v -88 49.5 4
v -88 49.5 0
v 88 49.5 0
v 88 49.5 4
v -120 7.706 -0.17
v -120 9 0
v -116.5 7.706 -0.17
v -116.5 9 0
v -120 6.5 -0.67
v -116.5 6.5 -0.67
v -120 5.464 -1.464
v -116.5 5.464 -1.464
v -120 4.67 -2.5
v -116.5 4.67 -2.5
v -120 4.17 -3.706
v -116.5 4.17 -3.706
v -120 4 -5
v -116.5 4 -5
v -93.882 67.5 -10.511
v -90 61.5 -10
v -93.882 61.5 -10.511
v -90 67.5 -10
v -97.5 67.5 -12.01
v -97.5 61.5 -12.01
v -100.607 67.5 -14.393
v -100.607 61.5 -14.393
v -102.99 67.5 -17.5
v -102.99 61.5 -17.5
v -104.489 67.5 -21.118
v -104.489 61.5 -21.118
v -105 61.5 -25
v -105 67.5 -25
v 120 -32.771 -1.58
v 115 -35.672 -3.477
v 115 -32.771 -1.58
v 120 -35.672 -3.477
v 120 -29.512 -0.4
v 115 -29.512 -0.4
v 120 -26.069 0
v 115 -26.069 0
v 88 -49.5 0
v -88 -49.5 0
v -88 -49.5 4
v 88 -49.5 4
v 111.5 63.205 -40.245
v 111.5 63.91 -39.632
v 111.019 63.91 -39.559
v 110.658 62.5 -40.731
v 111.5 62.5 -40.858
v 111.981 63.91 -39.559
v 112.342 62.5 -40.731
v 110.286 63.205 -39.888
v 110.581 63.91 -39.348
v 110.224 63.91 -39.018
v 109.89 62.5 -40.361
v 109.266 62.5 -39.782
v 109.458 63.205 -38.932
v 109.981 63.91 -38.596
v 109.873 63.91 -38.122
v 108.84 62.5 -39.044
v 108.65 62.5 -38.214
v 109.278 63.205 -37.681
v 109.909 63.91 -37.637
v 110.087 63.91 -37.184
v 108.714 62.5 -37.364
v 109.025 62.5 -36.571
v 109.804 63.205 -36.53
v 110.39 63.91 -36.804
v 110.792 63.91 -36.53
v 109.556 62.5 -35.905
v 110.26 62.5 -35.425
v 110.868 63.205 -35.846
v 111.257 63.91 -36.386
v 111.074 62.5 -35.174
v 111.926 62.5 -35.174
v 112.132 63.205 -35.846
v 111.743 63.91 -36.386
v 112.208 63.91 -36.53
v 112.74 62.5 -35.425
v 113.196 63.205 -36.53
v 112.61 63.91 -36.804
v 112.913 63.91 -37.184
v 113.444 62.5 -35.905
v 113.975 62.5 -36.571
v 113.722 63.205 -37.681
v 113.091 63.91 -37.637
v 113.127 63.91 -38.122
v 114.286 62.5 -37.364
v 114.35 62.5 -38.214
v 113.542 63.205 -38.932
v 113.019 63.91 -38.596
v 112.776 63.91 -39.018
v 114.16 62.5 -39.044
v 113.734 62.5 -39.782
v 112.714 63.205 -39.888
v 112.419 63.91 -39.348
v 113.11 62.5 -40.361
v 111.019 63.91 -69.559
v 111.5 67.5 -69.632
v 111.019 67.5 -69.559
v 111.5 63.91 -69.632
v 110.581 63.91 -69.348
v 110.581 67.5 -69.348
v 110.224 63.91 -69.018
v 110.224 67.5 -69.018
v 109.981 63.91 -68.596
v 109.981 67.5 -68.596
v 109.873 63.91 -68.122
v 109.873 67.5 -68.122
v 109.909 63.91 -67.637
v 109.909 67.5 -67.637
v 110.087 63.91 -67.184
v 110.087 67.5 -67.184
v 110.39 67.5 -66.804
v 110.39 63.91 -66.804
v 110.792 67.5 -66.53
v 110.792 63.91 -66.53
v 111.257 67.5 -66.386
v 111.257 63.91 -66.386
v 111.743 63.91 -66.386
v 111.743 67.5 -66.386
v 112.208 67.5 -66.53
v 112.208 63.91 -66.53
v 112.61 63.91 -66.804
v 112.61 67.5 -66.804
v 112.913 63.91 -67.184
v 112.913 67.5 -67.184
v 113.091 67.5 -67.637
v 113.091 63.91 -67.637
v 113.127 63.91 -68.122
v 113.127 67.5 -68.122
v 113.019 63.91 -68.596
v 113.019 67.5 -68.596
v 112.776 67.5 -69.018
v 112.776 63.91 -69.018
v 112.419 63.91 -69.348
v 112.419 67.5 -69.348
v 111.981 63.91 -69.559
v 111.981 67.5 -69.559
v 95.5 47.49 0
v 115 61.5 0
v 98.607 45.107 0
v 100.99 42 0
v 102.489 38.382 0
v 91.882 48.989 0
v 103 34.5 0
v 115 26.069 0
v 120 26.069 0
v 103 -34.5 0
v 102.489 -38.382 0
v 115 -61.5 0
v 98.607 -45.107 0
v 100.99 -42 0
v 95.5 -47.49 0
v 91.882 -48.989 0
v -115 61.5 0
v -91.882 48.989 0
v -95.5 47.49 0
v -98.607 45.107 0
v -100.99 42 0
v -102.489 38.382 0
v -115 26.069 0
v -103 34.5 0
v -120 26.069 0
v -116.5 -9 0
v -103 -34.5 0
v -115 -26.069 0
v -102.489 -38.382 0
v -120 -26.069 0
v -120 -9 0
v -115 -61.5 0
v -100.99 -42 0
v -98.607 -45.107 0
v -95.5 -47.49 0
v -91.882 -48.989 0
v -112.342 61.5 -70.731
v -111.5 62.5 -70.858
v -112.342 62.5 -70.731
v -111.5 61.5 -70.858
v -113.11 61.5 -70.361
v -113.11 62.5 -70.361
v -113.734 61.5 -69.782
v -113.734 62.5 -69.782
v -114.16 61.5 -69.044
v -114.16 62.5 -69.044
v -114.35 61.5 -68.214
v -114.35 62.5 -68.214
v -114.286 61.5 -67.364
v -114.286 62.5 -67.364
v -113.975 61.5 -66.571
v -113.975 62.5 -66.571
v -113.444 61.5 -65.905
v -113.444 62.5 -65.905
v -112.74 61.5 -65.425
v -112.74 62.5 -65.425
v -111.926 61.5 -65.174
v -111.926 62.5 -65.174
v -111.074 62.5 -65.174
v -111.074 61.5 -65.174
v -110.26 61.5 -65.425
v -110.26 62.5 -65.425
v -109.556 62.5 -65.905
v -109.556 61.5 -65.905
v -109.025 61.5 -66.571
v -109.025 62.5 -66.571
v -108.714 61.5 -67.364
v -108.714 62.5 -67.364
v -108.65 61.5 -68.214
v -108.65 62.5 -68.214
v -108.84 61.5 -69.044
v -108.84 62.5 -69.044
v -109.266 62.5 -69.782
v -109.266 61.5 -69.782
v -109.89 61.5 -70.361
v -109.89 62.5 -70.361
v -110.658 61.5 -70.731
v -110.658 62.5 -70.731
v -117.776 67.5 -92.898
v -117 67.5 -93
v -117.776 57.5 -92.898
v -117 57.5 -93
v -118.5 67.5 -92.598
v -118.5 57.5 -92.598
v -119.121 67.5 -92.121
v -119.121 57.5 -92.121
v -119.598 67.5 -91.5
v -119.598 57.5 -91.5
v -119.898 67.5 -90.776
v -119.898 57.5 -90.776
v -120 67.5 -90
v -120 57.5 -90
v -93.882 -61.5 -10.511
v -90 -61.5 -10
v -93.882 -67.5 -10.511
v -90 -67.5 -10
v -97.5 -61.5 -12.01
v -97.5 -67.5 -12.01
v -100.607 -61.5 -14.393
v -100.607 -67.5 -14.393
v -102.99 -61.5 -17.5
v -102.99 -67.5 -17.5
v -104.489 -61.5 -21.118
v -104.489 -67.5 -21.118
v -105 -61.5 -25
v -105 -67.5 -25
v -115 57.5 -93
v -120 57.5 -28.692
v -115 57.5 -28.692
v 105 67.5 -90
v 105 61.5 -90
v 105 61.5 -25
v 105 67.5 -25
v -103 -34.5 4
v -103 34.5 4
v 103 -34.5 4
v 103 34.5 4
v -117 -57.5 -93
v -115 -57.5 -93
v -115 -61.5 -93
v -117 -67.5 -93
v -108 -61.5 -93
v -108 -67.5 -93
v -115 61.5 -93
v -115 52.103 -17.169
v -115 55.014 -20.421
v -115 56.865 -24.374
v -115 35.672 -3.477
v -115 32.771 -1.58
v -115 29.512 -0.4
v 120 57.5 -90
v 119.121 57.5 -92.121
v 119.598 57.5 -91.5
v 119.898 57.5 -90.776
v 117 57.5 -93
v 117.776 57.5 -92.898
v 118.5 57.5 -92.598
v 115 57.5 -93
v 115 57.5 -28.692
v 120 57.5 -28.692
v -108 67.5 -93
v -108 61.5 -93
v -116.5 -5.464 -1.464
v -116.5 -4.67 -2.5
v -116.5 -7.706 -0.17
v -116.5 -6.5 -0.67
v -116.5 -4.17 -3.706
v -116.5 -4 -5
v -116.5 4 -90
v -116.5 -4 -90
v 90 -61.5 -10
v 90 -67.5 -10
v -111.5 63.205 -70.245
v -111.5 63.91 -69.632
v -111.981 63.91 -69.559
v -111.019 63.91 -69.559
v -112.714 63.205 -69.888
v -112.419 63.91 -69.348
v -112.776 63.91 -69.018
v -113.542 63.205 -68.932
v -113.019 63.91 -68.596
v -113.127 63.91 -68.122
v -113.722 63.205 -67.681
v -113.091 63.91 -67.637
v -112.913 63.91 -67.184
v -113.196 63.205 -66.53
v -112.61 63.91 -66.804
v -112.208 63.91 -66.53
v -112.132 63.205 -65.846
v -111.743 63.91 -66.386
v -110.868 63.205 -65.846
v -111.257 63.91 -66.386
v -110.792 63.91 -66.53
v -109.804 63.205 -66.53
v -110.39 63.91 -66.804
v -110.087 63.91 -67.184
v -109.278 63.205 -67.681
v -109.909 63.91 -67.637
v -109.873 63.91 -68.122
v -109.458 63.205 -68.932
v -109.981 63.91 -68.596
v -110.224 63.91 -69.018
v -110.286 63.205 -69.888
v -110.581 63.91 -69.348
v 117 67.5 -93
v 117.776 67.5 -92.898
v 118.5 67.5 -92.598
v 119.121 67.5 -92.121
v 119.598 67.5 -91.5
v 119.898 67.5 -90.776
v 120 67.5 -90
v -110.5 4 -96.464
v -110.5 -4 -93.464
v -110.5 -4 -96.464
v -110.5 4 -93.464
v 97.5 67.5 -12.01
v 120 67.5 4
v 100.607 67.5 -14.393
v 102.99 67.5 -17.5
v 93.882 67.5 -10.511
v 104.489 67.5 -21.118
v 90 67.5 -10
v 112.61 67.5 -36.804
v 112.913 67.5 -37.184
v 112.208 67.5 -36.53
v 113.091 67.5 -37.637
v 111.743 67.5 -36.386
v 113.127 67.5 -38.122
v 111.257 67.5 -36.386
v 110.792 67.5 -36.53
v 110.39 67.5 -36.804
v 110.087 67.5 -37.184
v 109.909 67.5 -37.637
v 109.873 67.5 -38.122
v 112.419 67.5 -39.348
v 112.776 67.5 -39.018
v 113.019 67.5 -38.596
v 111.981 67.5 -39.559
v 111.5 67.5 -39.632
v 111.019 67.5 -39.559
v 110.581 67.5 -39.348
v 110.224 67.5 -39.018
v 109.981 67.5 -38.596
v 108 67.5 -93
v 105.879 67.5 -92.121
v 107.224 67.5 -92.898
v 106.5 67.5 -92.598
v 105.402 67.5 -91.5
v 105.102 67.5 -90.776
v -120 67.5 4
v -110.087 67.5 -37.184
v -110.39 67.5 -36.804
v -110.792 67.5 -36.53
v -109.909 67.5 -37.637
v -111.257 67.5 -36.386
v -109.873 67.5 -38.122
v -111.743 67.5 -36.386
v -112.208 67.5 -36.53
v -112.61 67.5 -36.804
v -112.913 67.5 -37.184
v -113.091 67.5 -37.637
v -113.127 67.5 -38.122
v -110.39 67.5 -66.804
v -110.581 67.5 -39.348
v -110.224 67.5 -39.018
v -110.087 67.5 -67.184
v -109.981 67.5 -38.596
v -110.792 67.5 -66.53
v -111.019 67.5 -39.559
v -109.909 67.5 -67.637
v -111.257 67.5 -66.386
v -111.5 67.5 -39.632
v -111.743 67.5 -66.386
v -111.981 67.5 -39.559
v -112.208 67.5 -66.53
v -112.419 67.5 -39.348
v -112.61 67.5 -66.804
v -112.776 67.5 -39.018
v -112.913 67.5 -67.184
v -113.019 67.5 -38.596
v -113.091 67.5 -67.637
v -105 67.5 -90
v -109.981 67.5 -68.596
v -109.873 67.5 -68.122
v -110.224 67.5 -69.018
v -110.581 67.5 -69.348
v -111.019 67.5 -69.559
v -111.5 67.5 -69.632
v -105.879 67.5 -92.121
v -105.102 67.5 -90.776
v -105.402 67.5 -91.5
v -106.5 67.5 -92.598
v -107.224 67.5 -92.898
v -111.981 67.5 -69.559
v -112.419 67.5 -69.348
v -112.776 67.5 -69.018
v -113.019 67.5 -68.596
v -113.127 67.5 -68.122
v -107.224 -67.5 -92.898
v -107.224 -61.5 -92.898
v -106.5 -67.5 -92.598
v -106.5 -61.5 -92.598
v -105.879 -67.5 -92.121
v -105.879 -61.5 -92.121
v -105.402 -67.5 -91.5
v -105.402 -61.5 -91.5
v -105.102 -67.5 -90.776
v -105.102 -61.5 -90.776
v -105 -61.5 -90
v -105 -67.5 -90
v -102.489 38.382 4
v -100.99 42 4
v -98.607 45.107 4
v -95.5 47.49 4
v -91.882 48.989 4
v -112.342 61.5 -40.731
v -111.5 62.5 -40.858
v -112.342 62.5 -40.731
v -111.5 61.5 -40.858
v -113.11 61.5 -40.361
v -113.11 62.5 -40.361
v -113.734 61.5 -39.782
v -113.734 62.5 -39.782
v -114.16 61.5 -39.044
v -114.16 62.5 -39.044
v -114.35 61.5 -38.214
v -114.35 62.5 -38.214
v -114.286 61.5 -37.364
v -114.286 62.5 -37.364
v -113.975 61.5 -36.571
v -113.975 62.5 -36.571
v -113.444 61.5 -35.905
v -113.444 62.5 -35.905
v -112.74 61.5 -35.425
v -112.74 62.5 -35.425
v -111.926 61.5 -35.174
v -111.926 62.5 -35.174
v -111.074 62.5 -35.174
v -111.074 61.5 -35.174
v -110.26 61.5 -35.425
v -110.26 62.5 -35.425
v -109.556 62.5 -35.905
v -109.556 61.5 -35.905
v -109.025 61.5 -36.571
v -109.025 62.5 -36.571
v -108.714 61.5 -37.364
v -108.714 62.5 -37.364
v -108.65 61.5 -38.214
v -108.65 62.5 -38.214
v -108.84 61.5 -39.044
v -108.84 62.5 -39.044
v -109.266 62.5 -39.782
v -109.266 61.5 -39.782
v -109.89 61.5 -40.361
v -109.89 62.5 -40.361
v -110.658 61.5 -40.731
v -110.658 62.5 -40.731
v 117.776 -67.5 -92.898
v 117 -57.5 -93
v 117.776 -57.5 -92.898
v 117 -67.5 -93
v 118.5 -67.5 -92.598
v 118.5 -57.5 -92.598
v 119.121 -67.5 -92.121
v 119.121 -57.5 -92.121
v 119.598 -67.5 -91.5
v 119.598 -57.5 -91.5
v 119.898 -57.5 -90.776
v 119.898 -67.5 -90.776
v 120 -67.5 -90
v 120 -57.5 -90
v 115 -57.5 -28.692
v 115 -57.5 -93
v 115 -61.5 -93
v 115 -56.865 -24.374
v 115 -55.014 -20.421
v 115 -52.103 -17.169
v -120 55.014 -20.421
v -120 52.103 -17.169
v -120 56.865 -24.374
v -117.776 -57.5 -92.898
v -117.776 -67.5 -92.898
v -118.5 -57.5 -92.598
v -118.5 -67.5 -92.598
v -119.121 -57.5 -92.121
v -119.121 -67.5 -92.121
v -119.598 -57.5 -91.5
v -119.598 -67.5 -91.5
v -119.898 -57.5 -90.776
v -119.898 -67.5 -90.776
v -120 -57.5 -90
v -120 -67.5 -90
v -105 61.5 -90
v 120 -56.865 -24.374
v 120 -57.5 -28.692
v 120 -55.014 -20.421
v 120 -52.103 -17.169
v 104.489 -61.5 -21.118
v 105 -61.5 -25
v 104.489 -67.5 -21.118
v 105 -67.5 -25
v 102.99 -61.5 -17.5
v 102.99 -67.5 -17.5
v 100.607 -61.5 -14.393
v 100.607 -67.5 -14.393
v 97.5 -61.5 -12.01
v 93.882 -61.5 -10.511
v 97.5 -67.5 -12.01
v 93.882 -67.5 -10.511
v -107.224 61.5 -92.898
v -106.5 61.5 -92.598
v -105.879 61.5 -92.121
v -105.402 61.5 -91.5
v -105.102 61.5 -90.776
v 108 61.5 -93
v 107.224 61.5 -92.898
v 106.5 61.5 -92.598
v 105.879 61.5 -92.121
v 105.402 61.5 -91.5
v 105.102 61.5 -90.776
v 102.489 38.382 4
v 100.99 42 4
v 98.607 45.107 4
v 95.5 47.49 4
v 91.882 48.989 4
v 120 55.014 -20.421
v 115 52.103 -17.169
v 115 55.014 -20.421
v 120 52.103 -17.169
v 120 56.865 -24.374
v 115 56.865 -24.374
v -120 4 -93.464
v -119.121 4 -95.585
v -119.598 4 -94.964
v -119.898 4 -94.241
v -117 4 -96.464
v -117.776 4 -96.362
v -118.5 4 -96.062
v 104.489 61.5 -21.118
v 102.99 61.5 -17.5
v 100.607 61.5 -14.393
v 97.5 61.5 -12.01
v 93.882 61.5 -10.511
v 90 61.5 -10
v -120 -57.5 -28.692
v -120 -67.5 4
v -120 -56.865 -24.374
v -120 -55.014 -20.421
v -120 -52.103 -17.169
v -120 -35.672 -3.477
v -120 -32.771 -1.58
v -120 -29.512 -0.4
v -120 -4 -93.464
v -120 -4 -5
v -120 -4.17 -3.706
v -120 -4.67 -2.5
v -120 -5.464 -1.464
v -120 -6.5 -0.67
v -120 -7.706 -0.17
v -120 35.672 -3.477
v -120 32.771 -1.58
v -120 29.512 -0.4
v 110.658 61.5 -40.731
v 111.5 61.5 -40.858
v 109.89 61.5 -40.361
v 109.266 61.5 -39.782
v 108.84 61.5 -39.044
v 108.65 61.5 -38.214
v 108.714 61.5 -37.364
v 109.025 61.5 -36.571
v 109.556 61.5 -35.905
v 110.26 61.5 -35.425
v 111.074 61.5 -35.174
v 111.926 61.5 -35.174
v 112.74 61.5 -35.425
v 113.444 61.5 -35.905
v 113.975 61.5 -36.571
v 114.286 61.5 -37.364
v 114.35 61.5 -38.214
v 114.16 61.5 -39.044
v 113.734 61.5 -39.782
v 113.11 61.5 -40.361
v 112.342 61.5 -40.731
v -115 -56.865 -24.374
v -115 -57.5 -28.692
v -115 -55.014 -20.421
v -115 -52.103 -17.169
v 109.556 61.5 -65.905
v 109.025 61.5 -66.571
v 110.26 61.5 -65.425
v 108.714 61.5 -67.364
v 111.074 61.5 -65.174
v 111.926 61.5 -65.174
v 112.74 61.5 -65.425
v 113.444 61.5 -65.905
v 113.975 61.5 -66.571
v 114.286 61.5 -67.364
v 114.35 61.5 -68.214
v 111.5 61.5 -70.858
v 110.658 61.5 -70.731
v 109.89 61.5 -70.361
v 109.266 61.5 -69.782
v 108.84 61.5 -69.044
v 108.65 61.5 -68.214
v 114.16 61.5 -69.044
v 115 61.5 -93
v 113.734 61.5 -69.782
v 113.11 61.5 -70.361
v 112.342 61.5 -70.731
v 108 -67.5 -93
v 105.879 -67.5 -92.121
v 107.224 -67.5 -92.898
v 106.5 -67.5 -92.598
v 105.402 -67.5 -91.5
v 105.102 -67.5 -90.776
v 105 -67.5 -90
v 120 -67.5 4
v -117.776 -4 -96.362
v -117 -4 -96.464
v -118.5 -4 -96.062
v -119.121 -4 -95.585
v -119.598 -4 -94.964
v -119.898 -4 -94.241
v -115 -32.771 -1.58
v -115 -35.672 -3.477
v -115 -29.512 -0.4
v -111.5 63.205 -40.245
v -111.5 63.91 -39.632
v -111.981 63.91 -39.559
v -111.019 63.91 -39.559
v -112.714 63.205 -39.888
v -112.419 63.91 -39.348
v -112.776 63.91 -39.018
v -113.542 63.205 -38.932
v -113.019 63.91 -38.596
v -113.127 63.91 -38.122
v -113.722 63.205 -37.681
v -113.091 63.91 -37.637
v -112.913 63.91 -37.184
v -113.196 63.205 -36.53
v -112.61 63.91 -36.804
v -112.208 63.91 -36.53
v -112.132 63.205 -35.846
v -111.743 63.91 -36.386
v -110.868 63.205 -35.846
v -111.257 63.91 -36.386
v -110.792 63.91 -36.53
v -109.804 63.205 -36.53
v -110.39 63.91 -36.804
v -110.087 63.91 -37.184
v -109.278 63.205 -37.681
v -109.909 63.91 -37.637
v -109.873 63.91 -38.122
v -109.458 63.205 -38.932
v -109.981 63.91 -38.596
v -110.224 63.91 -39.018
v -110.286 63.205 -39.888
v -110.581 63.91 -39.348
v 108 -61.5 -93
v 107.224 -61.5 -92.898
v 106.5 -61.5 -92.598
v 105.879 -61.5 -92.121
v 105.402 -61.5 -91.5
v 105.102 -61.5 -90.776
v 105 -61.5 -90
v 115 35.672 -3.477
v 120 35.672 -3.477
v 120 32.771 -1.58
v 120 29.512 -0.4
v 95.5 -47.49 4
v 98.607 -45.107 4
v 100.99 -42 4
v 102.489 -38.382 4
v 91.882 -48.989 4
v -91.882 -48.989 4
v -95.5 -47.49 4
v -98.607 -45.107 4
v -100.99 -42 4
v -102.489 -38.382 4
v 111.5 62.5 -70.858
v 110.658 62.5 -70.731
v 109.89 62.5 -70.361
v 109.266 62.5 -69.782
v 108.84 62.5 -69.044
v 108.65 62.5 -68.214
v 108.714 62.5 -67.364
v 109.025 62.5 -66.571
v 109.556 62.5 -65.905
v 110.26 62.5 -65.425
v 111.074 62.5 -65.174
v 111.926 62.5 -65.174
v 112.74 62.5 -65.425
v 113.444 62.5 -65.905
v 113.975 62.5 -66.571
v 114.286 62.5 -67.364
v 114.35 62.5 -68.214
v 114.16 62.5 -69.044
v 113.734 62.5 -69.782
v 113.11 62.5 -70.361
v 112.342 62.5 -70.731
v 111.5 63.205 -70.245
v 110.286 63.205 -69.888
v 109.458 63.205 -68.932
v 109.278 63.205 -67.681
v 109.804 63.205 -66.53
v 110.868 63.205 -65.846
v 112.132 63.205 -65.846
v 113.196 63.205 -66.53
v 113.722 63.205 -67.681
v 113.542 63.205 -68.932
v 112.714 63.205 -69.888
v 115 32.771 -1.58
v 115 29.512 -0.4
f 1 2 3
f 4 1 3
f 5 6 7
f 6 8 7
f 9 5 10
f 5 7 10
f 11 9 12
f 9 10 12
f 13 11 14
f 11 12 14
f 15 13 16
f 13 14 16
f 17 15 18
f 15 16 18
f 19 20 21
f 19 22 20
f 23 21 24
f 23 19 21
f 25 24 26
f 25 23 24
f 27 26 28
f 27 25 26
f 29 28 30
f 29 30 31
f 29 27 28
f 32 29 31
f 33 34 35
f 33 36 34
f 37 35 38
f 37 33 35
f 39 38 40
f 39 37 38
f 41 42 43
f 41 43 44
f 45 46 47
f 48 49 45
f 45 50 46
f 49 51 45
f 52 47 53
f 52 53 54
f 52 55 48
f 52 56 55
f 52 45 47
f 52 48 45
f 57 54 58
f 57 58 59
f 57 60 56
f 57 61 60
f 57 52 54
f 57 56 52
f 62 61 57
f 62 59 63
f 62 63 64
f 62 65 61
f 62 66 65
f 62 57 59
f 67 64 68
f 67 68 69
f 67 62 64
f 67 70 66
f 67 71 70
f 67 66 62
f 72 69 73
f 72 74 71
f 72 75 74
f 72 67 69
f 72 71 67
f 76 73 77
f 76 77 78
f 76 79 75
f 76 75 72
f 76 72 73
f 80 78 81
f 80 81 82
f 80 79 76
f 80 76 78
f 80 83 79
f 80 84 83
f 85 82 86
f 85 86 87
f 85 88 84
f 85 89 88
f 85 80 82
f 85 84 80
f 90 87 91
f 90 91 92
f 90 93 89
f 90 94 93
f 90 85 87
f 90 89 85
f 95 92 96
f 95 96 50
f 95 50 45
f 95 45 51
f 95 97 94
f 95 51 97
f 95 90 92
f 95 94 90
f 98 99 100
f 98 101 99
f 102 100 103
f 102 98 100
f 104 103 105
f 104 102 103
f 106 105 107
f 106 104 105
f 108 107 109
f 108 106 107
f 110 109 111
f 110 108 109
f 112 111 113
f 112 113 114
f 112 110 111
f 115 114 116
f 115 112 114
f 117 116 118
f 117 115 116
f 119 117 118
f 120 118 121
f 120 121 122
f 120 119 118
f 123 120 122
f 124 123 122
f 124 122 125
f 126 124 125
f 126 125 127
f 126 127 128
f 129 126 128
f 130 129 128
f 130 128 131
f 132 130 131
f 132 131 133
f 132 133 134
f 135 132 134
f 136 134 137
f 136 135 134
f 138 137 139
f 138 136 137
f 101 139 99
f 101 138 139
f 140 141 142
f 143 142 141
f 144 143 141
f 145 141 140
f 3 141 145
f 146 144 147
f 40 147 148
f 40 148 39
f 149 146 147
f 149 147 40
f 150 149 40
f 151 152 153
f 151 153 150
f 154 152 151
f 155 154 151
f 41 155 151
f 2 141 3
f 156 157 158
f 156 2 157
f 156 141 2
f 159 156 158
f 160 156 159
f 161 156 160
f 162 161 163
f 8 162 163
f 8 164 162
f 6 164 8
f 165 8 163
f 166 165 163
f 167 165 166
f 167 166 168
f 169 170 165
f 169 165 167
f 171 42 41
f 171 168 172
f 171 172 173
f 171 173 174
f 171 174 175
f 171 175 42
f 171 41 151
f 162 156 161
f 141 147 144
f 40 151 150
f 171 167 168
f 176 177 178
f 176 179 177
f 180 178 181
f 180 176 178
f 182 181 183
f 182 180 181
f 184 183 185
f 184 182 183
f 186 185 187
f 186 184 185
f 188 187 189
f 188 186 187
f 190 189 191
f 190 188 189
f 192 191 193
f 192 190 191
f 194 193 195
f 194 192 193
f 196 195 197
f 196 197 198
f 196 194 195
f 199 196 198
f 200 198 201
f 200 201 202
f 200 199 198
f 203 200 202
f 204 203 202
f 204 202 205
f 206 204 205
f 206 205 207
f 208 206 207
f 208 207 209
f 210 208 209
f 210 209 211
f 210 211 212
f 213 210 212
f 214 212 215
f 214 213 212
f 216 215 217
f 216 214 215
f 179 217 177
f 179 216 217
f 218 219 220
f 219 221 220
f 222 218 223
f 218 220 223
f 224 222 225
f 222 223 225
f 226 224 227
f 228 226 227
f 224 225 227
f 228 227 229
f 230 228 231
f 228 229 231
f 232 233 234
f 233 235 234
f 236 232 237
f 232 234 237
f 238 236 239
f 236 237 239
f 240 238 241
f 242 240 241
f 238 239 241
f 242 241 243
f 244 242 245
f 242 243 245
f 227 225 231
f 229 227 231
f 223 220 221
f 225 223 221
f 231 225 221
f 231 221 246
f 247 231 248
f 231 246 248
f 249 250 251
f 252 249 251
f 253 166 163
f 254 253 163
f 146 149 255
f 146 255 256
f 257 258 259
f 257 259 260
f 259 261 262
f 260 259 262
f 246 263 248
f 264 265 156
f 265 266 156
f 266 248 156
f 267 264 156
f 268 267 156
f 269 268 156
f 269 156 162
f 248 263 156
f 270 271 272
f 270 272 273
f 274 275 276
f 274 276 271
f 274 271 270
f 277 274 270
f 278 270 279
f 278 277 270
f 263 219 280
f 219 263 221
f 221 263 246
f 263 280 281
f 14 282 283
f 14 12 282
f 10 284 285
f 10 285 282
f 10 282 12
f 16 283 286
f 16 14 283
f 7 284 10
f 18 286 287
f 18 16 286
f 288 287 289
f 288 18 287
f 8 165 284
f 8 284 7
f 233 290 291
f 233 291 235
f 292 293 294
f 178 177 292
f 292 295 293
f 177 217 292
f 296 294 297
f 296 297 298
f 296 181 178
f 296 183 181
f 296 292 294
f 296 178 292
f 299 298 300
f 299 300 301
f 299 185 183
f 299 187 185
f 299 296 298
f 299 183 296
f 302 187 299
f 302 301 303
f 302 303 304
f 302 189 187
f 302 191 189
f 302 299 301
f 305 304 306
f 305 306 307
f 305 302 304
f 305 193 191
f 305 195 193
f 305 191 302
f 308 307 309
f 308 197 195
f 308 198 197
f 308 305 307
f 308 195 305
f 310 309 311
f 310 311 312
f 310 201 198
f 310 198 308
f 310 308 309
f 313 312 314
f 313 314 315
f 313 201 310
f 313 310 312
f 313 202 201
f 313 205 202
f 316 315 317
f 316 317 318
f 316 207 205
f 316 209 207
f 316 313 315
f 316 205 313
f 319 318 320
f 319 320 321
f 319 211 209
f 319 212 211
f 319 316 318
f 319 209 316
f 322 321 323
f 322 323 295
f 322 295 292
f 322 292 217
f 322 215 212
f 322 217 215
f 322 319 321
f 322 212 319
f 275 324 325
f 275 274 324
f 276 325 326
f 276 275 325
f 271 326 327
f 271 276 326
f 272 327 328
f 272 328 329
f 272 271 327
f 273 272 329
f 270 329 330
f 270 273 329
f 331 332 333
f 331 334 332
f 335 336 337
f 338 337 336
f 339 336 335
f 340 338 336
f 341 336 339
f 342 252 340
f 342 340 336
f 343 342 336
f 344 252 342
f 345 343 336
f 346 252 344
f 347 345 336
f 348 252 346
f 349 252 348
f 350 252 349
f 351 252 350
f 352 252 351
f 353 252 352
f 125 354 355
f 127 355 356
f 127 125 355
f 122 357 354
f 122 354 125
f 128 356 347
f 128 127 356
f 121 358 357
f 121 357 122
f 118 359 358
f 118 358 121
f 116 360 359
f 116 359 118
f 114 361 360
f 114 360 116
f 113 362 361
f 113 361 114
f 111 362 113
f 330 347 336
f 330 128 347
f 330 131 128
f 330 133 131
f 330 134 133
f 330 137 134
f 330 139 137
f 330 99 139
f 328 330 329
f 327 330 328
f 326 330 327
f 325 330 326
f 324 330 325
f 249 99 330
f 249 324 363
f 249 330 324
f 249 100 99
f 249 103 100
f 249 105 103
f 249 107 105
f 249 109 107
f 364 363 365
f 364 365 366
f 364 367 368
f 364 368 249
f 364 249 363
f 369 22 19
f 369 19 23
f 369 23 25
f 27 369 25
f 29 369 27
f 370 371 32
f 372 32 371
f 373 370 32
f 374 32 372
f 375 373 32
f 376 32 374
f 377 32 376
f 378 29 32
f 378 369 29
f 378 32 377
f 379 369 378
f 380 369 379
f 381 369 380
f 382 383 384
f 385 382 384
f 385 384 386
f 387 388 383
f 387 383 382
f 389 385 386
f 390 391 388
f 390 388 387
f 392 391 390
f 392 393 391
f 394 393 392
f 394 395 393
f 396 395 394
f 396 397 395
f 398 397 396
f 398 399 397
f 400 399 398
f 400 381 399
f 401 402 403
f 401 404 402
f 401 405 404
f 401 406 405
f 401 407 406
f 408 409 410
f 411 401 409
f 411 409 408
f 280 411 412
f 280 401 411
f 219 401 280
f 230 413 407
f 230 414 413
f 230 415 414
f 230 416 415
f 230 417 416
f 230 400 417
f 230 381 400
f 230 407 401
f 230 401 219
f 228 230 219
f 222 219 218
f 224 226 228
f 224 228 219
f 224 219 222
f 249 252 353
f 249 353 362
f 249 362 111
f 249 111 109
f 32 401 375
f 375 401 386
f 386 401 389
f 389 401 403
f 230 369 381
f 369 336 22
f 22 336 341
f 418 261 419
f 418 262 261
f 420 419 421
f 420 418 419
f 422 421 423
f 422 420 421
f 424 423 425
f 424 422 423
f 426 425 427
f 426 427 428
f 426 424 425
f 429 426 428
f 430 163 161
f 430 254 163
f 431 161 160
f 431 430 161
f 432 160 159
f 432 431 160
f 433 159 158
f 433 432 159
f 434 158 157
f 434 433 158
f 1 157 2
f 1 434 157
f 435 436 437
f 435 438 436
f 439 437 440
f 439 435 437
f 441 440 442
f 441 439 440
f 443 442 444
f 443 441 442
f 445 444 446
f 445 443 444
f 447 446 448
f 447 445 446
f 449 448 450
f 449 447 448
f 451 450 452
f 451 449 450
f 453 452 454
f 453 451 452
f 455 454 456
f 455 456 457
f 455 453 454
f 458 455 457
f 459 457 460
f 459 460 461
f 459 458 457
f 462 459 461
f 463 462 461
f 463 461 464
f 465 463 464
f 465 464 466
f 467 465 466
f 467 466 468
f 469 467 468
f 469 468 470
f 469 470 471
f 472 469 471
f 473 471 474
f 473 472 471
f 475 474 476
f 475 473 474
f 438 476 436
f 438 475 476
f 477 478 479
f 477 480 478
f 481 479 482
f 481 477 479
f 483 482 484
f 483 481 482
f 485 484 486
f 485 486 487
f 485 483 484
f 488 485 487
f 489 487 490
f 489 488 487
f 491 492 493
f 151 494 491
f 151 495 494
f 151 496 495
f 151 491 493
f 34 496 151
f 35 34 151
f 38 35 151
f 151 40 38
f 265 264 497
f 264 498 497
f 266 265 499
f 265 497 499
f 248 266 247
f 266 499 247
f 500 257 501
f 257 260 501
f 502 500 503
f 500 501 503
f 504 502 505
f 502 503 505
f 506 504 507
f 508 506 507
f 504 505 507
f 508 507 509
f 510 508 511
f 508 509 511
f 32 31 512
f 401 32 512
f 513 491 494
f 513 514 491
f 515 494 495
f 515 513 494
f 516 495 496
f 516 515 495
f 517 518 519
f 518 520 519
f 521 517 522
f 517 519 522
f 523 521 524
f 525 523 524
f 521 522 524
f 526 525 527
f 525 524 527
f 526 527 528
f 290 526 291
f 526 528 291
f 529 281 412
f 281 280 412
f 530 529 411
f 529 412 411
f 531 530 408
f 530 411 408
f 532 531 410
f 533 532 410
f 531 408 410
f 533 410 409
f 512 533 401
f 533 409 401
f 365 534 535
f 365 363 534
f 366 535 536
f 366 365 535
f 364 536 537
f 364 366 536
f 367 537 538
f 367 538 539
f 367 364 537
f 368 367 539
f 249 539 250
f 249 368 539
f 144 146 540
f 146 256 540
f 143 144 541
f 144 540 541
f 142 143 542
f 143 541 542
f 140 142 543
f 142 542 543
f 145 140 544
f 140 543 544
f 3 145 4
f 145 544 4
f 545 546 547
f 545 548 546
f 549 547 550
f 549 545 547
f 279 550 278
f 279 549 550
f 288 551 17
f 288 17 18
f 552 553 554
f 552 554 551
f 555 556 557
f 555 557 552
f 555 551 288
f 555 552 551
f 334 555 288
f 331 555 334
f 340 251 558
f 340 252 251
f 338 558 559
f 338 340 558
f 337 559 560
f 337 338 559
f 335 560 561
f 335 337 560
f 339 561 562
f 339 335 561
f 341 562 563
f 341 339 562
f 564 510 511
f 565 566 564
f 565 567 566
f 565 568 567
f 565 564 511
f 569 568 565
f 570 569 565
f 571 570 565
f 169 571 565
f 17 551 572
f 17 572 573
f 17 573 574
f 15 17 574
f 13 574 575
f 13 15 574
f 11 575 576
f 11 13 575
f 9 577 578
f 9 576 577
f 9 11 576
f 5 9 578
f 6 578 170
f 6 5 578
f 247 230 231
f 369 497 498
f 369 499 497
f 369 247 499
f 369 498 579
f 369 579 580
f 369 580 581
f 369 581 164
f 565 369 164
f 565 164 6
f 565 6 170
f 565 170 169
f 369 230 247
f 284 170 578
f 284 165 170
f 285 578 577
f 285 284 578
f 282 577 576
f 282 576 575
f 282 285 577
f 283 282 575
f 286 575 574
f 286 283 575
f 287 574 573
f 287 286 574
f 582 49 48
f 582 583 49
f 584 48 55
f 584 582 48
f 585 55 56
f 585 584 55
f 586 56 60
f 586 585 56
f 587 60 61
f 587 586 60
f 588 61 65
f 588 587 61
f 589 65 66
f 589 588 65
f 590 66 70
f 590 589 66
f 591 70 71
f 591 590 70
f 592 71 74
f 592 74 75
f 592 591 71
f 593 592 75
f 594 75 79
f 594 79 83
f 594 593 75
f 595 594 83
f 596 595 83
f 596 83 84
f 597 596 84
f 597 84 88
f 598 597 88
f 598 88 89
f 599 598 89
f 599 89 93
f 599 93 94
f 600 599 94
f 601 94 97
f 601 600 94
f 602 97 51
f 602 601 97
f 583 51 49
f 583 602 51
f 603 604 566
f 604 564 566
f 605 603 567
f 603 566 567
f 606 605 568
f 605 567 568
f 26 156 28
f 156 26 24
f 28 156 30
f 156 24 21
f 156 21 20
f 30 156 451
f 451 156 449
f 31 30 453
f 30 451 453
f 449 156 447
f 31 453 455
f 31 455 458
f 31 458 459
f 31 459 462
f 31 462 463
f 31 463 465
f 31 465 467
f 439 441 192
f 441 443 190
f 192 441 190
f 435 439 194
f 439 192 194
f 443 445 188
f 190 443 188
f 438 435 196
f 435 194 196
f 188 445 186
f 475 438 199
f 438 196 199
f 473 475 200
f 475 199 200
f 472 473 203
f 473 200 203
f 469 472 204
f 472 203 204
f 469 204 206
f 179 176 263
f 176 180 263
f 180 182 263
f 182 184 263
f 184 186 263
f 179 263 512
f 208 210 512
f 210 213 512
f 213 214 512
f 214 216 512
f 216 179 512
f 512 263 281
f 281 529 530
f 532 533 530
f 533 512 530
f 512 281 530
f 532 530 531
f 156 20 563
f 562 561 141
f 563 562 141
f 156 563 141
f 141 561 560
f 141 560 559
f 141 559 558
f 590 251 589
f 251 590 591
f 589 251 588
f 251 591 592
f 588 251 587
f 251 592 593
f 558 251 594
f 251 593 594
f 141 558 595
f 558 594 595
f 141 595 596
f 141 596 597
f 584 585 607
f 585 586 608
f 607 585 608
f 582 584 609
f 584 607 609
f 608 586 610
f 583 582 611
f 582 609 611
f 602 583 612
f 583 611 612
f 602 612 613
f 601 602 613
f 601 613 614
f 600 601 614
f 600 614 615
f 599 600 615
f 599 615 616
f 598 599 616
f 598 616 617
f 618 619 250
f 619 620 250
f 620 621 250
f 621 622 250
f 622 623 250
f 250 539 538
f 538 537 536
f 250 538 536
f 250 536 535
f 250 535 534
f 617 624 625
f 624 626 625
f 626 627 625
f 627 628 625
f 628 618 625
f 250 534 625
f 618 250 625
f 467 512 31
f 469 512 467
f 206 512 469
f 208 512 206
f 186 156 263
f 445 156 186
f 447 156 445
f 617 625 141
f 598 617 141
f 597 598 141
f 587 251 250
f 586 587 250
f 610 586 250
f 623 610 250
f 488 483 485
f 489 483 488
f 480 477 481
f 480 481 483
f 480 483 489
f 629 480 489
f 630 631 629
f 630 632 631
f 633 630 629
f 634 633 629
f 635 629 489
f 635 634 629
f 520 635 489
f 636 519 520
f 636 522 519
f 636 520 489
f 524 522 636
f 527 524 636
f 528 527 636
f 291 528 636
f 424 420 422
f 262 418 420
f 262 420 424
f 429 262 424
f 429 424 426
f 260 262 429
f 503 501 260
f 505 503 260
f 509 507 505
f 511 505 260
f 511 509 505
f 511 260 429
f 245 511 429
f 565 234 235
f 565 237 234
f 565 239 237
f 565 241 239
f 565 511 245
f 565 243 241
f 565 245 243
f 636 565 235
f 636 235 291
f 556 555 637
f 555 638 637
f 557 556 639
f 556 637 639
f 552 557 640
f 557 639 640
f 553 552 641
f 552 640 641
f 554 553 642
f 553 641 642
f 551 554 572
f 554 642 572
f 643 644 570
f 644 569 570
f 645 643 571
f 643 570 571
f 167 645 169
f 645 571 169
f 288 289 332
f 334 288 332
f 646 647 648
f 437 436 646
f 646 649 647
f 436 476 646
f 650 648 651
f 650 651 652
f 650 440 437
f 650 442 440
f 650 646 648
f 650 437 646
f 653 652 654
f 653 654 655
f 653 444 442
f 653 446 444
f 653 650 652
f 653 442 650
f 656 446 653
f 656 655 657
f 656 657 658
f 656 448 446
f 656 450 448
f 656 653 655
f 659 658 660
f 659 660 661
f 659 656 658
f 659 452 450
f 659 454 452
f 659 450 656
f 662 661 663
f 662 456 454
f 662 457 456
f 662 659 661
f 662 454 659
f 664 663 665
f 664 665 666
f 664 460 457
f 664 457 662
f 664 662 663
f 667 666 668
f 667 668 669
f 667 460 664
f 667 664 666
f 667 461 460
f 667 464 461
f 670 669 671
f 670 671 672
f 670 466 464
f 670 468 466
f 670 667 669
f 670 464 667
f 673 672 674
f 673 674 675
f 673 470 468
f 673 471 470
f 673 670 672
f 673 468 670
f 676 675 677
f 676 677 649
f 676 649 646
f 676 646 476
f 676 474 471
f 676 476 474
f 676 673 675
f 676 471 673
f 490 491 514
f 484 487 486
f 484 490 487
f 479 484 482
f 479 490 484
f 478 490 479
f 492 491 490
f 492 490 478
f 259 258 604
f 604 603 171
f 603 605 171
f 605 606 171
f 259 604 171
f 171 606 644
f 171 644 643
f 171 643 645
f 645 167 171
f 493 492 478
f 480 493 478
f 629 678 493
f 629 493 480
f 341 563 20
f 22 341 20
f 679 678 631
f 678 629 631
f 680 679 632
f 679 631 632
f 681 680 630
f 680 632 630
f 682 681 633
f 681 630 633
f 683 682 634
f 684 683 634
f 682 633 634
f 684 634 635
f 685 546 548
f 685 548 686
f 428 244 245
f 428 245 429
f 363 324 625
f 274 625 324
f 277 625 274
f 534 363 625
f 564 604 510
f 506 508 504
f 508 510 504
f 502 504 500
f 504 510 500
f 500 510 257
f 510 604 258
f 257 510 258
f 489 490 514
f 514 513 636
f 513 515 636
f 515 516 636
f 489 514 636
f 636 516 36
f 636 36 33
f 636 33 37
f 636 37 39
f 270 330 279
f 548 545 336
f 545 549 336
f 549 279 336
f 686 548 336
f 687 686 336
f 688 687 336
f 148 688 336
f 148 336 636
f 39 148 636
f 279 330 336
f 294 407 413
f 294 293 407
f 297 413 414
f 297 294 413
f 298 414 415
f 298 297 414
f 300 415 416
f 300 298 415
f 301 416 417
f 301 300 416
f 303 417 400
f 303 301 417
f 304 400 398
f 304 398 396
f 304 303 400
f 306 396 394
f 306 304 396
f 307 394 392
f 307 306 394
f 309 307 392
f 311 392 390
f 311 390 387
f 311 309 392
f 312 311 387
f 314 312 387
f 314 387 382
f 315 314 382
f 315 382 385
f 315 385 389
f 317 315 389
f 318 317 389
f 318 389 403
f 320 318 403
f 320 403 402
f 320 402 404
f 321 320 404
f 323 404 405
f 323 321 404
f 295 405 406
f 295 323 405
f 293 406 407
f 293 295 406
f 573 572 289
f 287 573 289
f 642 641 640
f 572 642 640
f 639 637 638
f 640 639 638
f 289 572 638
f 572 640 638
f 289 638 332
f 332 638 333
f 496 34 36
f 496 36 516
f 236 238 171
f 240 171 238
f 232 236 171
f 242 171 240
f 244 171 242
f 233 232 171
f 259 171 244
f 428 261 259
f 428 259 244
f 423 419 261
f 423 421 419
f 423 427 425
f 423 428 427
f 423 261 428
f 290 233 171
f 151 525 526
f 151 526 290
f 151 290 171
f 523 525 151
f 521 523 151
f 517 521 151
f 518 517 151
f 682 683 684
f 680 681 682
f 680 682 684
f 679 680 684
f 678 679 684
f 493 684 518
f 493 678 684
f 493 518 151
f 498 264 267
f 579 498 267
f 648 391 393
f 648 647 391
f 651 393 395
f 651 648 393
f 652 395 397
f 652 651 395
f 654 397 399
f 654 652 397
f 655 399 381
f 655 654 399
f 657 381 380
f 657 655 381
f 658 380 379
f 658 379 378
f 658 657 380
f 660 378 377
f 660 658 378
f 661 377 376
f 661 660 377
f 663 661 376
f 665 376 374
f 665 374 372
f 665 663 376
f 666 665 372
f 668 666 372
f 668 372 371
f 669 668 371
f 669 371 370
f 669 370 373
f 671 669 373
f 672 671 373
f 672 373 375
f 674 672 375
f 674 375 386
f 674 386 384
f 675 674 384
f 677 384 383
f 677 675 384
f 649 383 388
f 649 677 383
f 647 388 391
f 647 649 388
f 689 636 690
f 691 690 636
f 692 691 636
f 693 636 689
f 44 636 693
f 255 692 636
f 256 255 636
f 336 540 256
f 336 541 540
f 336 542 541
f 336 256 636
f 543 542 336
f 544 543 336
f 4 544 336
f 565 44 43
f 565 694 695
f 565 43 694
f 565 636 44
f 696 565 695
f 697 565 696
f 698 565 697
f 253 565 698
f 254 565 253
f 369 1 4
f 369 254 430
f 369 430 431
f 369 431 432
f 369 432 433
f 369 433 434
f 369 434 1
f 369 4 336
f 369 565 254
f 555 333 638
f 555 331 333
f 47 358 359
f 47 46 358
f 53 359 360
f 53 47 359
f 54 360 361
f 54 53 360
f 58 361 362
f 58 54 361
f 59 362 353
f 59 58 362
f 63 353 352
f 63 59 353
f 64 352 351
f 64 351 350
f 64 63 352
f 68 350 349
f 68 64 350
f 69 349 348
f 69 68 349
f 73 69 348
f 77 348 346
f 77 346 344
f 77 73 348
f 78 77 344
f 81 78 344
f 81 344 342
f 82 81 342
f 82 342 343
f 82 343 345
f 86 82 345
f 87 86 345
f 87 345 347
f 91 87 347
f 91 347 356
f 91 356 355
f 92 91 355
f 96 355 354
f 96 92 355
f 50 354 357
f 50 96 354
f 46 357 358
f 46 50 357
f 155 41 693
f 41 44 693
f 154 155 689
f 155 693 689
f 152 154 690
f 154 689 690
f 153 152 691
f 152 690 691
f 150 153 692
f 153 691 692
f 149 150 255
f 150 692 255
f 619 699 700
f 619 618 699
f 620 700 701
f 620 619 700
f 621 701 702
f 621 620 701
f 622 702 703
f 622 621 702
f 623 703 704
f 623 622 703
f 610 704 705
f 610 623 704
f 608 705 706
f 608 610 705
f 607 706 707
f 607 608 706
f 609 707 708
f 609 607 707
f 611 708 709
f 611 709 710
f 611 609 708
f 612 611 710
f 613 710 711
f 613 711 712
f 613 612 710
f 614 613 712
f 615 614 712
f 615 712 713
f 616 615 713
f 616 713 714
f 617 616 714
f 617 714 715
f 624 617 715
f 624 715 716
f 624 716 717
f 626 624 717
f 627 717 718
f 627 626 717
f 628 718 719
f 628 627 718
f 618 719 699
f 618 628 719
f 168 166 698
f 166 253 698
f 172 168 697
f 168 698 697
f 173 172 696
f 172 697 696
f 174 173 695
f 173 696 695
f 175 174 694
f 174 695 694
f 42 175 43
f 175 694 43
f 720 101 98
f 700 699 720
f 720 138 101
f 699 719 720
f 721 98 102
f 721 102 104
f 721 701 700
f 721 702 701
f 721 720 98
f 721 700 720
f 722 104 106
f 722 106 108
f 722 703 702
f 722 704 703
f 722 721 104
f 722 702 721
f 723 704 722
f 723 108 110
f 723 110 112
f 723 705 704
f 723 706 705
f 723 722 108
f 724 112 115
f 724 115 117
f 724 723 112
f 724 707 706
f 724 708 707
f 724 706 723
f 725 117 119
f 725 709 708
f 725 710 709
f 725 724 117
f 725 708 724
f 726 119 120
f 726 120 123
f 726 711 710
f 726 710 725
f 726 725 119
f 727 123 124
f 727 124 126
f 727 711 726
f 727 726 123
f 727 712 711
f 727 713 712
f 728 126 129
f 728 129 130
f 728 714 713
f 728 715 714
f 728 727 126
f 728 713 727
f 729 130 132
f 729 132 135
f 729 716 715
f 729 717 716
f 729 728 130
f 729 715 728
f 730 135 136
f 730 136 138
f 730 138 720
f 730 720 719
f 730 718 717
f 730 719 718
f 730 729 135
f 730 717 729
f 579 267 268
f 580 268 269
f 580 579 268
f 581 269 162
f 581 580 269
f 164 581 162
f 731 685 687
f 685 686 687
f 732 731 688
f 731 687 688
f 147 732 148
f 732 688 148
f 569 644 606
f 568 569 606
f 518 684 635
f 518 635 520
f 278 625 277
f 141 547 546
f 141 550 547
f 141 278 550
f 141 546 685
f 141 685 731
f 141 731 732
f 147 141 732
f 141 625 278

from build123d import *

# Parameters (mm, degrees)
SKETCH1_W                                     = 230
SKETCH1_H                                     = 123
SKETCH1_W_2                                   = 206
SKETCH1_H_2                                   = 99
BOSS_EXTRUDE1_DEPTH                           = 4
SKETCH2_W                                     = 230
SKETCH2_H                                     = 4
BOSS_EXTRUDE2_DEPTH                           = 6
BOSS_EXTRUDE3_DEPTH                           = 5
FILLET1_R                                     = 15
BOSS_EXTRUDE4_DEPTH                           = 4
FILLET2_R                                     = 5
FILLET3_R                                     = 3
CSK_FOR_4_FLAT_HEAD_MACHINE_SCREW1_AT_2_COUNT = 2
CSK_FOR_4_FLAT_HEAD_MACHINE_SCREW1_AT_2_PITCH = 30
CSK_FOR_4_FLAT_HEAD_MACHINE_SCREW1_AT_3_COUNT = 2
CSK_FOR_4_FLAT_HEAD_MACHINE_SCREW1_AT_3_PITCH = 225.008888713
CSK_FOR_4_FLAT_HEAD_MACHINE_SCREW1_AT_4_COUNT = 2
CSK_FOR_4_FLAT_HEAD_MACHINE_SCREW1_AT_4_PITCH = 223


with BuildPart() as part:
    # Sketch1 → Boss-Extrude1 (new body)
    with BuildSketch(Plane.XY):
        Rectangle(SKETCH1_W, SKETCH1_H)
        Rectangle(SKETCH1_W_2, SKETCH1_H_2, mode=Mode.SUBTRACT)
    extrude(amount=BOSS_EXTRUDE1_DEPTH)

    # Sketch2 → Boss-Extrude2 (add)
    with BuildSketch(Plane(origin=(0, 61.5, 0), x_dir=(1, 0, 0), z_dir=(0, 1, 0))):
        Polygon((-115, 10), (-115, 0), (115, 0), (115, 10), (115, 93), (105, 93), (105, 10), (-105, 10), (-105, 93), (-115, 93), align=None)
        with Locations((0, -2)):
            Rectangle(SKETCH2_W, SKETCH2_H)
    boss_extrude2 = extrude(amount=BOSS_EXTRUDE2_DEPTH)

    # Mirror1: Boss-Extrude2 across plane
    add(boss_extrude2.mirror(Plane.ZX))

    # Sketch3 → Boss-Extrude3 (add)
    with BuildSketch(Plane.ZY.offset(115)):
        Polygon((-93, 61.5), (0, 61.5), (0, -61.5), (-93, -61.5), (-93, -67.5), (4, -67.5), (4, 67.5), (-93, 67.5), align=None)
        Polygon((0, 61.5), (-25, 61.5), (-21.666666667, 57.5), (0, 31.5), align=None)
        Polygon((0, -61.5), (0, -31.5), (-21.666666667, -57.5), (-25, -61.5), align=None)
        Polygon((-21.666666667, 57.5), (-25, 61.5), (-93, 61.5), (-93, 57.5), align=None)
        Polygon((-25, -61.5), (-21.666666667, -57.5), (-93, -57.5), (-93, -61.5), align=None)
    boss_extrude3 = extrude(amount=BOSS_EXTRUDE3_DEPTH)

    # Mirror2: Boss-Extrude3 across plane
    add(boss_extrude3.mirror(Plane(origin=(0, 0, 0), x_dir=(0, 0, 1), z_dir=(1, 0, 0))))

    # Fillet1
    fillet1_edges = [part.edges().sort_by_distance(p)[0] for p in [
        (117.5, 57.5, -21.666666667),
        (117.5, -57.5, -21.666666667),
        (117.5, -31.5, 0),
        (117.5, 31.5, 0),
        (-103, -49.5, 2),
        (103, -49.5, 2),
        (103, 49.5, 2),
        (-103, 49.5, 2),
        (105, 64.5, -10),
        (-105, 64.5, -10),
        (-105, -64.5, -10),
        (105, -64.5, -10),
        (-117.5, 57.5, -21.666666667),
        (-117.5, 31.5, 0),
        (-117.5, -31.5, 0),
        (-117.5, -57.5, -21.666666667),
    ]]
    fillet(fillet1_edges, radius=FILLET1_R)

    # Sketch4 → Boss-Extrude4 (add, symmetric)
    with BuildSketch(Plane(origin=(0, 0, 0), x_dir=(1, 0, 0), z_dir=(0, 1, 0))):
        Polygon((-120, 96.464101615), (-120, 0), (-116.5, 0), (-116.5, 90), (-110.5, 93.464101615), (-110.5, 96.464101615), align=None)
    extrude(amount=BOSS_EXTRUDE4_DEPTH, both=True)

    # Fillet2
    fillet2_edges = [part.edges().sort_by_distance(p)[0] for p in [
        (-118.25, 4, 0),
        (-118.25, -4, 0),
    ]]
    fillet(fillet2_edges, radius=FILLET2_R)

    # Fillet3
    fillet3_edges = [part.edges().sort_by_distance(p)[0] for p in [
        (120, 62.5, -93),
        (120, -62.5, -93),
        (105, 64.5, -93),
        (-120, 0, -96.464101615),
        (-105, 64.5, -93),
        (-105, -64.5, -93),
        (105, -64.5, -93),
        (-120, -62.5, -93),
        (-120, 62.5, -93),
    ]]
    fillet(fillet3_edges, radius=FILLET3_R)

    # Sketch6 → CSK for #4 Flat Head Machine Screw1 (revolve, cut)
    with BuildSketch(Plane(origin=(111.5, 61.5, -68), x_dir=(0, 0, -1), z_dir=(1, 0, 0))):
        Polygon((0, 0), (0, 6), (1.63195, 6), (1.63195, 2.409835609), (2.857501397, 1), (2.857501397, 0), align=None)
    csk_for_4_flat_head_machine_screw1 = revolve(axis=Axis((111.5, 55.15, -68), (0, 1, 0)), mode=Mode.SUBTRACT)

    # CSK for #4 Flat Head Machine Screw1 at 2: CSK for #4 Flat Head Machine Screw1 ×2
    with Locations(*[(0, 0, i * CSK_FOR_4_FLAT_HEAD_MACHINE_SCREW1_AT_2_PITCH) for i in range(1, CSK_FOR_4_FLAT_HEAD_MACHINE_SCREW1_AT_2_COUNT)]):
        add(csk_for_4_flat_head_machine_screw1, mode=Mode.SUBTRACT)

    # CSK for #4 Flat Head Machine Screw1 at 3: CSK for #4 Flat Head Machine Screw1 ×2
    with Locations(*[Vector(-0.9910719584243963, 0, 0.13332806615574816) * (i * CSK_FOR_4_FLAT_HEAD_MACHINE_SCREW1_AT_3_PITCH) for i in range(1, CSK_FOR_4_FLAT_HEAD_MACHINE_SCREW1_AT_3_COUNT)]):
        add(csk_for_4_flat_head_machine_screw1, mode=Mode.SUBTRACT)

    # CSK for #4 Flat Head Machine Screw1 at 4: CSK for #4 Flat Head Machine Screw1 ×2
    with Locations(*[(-i * CSK_FOR_4_FLAT_HEAD_MACHINE_SCREW1_AT_4_PITCH, 0, 0) for i in range(1, CSK_FOR_4_FLAT_HEAD_MACHINE_SCREW1_AT_4_COUNT)]):
        add(csk_for_4_flat_head_machine_screw1, mode=Mode.SUBTRACT)


solid = part.part
